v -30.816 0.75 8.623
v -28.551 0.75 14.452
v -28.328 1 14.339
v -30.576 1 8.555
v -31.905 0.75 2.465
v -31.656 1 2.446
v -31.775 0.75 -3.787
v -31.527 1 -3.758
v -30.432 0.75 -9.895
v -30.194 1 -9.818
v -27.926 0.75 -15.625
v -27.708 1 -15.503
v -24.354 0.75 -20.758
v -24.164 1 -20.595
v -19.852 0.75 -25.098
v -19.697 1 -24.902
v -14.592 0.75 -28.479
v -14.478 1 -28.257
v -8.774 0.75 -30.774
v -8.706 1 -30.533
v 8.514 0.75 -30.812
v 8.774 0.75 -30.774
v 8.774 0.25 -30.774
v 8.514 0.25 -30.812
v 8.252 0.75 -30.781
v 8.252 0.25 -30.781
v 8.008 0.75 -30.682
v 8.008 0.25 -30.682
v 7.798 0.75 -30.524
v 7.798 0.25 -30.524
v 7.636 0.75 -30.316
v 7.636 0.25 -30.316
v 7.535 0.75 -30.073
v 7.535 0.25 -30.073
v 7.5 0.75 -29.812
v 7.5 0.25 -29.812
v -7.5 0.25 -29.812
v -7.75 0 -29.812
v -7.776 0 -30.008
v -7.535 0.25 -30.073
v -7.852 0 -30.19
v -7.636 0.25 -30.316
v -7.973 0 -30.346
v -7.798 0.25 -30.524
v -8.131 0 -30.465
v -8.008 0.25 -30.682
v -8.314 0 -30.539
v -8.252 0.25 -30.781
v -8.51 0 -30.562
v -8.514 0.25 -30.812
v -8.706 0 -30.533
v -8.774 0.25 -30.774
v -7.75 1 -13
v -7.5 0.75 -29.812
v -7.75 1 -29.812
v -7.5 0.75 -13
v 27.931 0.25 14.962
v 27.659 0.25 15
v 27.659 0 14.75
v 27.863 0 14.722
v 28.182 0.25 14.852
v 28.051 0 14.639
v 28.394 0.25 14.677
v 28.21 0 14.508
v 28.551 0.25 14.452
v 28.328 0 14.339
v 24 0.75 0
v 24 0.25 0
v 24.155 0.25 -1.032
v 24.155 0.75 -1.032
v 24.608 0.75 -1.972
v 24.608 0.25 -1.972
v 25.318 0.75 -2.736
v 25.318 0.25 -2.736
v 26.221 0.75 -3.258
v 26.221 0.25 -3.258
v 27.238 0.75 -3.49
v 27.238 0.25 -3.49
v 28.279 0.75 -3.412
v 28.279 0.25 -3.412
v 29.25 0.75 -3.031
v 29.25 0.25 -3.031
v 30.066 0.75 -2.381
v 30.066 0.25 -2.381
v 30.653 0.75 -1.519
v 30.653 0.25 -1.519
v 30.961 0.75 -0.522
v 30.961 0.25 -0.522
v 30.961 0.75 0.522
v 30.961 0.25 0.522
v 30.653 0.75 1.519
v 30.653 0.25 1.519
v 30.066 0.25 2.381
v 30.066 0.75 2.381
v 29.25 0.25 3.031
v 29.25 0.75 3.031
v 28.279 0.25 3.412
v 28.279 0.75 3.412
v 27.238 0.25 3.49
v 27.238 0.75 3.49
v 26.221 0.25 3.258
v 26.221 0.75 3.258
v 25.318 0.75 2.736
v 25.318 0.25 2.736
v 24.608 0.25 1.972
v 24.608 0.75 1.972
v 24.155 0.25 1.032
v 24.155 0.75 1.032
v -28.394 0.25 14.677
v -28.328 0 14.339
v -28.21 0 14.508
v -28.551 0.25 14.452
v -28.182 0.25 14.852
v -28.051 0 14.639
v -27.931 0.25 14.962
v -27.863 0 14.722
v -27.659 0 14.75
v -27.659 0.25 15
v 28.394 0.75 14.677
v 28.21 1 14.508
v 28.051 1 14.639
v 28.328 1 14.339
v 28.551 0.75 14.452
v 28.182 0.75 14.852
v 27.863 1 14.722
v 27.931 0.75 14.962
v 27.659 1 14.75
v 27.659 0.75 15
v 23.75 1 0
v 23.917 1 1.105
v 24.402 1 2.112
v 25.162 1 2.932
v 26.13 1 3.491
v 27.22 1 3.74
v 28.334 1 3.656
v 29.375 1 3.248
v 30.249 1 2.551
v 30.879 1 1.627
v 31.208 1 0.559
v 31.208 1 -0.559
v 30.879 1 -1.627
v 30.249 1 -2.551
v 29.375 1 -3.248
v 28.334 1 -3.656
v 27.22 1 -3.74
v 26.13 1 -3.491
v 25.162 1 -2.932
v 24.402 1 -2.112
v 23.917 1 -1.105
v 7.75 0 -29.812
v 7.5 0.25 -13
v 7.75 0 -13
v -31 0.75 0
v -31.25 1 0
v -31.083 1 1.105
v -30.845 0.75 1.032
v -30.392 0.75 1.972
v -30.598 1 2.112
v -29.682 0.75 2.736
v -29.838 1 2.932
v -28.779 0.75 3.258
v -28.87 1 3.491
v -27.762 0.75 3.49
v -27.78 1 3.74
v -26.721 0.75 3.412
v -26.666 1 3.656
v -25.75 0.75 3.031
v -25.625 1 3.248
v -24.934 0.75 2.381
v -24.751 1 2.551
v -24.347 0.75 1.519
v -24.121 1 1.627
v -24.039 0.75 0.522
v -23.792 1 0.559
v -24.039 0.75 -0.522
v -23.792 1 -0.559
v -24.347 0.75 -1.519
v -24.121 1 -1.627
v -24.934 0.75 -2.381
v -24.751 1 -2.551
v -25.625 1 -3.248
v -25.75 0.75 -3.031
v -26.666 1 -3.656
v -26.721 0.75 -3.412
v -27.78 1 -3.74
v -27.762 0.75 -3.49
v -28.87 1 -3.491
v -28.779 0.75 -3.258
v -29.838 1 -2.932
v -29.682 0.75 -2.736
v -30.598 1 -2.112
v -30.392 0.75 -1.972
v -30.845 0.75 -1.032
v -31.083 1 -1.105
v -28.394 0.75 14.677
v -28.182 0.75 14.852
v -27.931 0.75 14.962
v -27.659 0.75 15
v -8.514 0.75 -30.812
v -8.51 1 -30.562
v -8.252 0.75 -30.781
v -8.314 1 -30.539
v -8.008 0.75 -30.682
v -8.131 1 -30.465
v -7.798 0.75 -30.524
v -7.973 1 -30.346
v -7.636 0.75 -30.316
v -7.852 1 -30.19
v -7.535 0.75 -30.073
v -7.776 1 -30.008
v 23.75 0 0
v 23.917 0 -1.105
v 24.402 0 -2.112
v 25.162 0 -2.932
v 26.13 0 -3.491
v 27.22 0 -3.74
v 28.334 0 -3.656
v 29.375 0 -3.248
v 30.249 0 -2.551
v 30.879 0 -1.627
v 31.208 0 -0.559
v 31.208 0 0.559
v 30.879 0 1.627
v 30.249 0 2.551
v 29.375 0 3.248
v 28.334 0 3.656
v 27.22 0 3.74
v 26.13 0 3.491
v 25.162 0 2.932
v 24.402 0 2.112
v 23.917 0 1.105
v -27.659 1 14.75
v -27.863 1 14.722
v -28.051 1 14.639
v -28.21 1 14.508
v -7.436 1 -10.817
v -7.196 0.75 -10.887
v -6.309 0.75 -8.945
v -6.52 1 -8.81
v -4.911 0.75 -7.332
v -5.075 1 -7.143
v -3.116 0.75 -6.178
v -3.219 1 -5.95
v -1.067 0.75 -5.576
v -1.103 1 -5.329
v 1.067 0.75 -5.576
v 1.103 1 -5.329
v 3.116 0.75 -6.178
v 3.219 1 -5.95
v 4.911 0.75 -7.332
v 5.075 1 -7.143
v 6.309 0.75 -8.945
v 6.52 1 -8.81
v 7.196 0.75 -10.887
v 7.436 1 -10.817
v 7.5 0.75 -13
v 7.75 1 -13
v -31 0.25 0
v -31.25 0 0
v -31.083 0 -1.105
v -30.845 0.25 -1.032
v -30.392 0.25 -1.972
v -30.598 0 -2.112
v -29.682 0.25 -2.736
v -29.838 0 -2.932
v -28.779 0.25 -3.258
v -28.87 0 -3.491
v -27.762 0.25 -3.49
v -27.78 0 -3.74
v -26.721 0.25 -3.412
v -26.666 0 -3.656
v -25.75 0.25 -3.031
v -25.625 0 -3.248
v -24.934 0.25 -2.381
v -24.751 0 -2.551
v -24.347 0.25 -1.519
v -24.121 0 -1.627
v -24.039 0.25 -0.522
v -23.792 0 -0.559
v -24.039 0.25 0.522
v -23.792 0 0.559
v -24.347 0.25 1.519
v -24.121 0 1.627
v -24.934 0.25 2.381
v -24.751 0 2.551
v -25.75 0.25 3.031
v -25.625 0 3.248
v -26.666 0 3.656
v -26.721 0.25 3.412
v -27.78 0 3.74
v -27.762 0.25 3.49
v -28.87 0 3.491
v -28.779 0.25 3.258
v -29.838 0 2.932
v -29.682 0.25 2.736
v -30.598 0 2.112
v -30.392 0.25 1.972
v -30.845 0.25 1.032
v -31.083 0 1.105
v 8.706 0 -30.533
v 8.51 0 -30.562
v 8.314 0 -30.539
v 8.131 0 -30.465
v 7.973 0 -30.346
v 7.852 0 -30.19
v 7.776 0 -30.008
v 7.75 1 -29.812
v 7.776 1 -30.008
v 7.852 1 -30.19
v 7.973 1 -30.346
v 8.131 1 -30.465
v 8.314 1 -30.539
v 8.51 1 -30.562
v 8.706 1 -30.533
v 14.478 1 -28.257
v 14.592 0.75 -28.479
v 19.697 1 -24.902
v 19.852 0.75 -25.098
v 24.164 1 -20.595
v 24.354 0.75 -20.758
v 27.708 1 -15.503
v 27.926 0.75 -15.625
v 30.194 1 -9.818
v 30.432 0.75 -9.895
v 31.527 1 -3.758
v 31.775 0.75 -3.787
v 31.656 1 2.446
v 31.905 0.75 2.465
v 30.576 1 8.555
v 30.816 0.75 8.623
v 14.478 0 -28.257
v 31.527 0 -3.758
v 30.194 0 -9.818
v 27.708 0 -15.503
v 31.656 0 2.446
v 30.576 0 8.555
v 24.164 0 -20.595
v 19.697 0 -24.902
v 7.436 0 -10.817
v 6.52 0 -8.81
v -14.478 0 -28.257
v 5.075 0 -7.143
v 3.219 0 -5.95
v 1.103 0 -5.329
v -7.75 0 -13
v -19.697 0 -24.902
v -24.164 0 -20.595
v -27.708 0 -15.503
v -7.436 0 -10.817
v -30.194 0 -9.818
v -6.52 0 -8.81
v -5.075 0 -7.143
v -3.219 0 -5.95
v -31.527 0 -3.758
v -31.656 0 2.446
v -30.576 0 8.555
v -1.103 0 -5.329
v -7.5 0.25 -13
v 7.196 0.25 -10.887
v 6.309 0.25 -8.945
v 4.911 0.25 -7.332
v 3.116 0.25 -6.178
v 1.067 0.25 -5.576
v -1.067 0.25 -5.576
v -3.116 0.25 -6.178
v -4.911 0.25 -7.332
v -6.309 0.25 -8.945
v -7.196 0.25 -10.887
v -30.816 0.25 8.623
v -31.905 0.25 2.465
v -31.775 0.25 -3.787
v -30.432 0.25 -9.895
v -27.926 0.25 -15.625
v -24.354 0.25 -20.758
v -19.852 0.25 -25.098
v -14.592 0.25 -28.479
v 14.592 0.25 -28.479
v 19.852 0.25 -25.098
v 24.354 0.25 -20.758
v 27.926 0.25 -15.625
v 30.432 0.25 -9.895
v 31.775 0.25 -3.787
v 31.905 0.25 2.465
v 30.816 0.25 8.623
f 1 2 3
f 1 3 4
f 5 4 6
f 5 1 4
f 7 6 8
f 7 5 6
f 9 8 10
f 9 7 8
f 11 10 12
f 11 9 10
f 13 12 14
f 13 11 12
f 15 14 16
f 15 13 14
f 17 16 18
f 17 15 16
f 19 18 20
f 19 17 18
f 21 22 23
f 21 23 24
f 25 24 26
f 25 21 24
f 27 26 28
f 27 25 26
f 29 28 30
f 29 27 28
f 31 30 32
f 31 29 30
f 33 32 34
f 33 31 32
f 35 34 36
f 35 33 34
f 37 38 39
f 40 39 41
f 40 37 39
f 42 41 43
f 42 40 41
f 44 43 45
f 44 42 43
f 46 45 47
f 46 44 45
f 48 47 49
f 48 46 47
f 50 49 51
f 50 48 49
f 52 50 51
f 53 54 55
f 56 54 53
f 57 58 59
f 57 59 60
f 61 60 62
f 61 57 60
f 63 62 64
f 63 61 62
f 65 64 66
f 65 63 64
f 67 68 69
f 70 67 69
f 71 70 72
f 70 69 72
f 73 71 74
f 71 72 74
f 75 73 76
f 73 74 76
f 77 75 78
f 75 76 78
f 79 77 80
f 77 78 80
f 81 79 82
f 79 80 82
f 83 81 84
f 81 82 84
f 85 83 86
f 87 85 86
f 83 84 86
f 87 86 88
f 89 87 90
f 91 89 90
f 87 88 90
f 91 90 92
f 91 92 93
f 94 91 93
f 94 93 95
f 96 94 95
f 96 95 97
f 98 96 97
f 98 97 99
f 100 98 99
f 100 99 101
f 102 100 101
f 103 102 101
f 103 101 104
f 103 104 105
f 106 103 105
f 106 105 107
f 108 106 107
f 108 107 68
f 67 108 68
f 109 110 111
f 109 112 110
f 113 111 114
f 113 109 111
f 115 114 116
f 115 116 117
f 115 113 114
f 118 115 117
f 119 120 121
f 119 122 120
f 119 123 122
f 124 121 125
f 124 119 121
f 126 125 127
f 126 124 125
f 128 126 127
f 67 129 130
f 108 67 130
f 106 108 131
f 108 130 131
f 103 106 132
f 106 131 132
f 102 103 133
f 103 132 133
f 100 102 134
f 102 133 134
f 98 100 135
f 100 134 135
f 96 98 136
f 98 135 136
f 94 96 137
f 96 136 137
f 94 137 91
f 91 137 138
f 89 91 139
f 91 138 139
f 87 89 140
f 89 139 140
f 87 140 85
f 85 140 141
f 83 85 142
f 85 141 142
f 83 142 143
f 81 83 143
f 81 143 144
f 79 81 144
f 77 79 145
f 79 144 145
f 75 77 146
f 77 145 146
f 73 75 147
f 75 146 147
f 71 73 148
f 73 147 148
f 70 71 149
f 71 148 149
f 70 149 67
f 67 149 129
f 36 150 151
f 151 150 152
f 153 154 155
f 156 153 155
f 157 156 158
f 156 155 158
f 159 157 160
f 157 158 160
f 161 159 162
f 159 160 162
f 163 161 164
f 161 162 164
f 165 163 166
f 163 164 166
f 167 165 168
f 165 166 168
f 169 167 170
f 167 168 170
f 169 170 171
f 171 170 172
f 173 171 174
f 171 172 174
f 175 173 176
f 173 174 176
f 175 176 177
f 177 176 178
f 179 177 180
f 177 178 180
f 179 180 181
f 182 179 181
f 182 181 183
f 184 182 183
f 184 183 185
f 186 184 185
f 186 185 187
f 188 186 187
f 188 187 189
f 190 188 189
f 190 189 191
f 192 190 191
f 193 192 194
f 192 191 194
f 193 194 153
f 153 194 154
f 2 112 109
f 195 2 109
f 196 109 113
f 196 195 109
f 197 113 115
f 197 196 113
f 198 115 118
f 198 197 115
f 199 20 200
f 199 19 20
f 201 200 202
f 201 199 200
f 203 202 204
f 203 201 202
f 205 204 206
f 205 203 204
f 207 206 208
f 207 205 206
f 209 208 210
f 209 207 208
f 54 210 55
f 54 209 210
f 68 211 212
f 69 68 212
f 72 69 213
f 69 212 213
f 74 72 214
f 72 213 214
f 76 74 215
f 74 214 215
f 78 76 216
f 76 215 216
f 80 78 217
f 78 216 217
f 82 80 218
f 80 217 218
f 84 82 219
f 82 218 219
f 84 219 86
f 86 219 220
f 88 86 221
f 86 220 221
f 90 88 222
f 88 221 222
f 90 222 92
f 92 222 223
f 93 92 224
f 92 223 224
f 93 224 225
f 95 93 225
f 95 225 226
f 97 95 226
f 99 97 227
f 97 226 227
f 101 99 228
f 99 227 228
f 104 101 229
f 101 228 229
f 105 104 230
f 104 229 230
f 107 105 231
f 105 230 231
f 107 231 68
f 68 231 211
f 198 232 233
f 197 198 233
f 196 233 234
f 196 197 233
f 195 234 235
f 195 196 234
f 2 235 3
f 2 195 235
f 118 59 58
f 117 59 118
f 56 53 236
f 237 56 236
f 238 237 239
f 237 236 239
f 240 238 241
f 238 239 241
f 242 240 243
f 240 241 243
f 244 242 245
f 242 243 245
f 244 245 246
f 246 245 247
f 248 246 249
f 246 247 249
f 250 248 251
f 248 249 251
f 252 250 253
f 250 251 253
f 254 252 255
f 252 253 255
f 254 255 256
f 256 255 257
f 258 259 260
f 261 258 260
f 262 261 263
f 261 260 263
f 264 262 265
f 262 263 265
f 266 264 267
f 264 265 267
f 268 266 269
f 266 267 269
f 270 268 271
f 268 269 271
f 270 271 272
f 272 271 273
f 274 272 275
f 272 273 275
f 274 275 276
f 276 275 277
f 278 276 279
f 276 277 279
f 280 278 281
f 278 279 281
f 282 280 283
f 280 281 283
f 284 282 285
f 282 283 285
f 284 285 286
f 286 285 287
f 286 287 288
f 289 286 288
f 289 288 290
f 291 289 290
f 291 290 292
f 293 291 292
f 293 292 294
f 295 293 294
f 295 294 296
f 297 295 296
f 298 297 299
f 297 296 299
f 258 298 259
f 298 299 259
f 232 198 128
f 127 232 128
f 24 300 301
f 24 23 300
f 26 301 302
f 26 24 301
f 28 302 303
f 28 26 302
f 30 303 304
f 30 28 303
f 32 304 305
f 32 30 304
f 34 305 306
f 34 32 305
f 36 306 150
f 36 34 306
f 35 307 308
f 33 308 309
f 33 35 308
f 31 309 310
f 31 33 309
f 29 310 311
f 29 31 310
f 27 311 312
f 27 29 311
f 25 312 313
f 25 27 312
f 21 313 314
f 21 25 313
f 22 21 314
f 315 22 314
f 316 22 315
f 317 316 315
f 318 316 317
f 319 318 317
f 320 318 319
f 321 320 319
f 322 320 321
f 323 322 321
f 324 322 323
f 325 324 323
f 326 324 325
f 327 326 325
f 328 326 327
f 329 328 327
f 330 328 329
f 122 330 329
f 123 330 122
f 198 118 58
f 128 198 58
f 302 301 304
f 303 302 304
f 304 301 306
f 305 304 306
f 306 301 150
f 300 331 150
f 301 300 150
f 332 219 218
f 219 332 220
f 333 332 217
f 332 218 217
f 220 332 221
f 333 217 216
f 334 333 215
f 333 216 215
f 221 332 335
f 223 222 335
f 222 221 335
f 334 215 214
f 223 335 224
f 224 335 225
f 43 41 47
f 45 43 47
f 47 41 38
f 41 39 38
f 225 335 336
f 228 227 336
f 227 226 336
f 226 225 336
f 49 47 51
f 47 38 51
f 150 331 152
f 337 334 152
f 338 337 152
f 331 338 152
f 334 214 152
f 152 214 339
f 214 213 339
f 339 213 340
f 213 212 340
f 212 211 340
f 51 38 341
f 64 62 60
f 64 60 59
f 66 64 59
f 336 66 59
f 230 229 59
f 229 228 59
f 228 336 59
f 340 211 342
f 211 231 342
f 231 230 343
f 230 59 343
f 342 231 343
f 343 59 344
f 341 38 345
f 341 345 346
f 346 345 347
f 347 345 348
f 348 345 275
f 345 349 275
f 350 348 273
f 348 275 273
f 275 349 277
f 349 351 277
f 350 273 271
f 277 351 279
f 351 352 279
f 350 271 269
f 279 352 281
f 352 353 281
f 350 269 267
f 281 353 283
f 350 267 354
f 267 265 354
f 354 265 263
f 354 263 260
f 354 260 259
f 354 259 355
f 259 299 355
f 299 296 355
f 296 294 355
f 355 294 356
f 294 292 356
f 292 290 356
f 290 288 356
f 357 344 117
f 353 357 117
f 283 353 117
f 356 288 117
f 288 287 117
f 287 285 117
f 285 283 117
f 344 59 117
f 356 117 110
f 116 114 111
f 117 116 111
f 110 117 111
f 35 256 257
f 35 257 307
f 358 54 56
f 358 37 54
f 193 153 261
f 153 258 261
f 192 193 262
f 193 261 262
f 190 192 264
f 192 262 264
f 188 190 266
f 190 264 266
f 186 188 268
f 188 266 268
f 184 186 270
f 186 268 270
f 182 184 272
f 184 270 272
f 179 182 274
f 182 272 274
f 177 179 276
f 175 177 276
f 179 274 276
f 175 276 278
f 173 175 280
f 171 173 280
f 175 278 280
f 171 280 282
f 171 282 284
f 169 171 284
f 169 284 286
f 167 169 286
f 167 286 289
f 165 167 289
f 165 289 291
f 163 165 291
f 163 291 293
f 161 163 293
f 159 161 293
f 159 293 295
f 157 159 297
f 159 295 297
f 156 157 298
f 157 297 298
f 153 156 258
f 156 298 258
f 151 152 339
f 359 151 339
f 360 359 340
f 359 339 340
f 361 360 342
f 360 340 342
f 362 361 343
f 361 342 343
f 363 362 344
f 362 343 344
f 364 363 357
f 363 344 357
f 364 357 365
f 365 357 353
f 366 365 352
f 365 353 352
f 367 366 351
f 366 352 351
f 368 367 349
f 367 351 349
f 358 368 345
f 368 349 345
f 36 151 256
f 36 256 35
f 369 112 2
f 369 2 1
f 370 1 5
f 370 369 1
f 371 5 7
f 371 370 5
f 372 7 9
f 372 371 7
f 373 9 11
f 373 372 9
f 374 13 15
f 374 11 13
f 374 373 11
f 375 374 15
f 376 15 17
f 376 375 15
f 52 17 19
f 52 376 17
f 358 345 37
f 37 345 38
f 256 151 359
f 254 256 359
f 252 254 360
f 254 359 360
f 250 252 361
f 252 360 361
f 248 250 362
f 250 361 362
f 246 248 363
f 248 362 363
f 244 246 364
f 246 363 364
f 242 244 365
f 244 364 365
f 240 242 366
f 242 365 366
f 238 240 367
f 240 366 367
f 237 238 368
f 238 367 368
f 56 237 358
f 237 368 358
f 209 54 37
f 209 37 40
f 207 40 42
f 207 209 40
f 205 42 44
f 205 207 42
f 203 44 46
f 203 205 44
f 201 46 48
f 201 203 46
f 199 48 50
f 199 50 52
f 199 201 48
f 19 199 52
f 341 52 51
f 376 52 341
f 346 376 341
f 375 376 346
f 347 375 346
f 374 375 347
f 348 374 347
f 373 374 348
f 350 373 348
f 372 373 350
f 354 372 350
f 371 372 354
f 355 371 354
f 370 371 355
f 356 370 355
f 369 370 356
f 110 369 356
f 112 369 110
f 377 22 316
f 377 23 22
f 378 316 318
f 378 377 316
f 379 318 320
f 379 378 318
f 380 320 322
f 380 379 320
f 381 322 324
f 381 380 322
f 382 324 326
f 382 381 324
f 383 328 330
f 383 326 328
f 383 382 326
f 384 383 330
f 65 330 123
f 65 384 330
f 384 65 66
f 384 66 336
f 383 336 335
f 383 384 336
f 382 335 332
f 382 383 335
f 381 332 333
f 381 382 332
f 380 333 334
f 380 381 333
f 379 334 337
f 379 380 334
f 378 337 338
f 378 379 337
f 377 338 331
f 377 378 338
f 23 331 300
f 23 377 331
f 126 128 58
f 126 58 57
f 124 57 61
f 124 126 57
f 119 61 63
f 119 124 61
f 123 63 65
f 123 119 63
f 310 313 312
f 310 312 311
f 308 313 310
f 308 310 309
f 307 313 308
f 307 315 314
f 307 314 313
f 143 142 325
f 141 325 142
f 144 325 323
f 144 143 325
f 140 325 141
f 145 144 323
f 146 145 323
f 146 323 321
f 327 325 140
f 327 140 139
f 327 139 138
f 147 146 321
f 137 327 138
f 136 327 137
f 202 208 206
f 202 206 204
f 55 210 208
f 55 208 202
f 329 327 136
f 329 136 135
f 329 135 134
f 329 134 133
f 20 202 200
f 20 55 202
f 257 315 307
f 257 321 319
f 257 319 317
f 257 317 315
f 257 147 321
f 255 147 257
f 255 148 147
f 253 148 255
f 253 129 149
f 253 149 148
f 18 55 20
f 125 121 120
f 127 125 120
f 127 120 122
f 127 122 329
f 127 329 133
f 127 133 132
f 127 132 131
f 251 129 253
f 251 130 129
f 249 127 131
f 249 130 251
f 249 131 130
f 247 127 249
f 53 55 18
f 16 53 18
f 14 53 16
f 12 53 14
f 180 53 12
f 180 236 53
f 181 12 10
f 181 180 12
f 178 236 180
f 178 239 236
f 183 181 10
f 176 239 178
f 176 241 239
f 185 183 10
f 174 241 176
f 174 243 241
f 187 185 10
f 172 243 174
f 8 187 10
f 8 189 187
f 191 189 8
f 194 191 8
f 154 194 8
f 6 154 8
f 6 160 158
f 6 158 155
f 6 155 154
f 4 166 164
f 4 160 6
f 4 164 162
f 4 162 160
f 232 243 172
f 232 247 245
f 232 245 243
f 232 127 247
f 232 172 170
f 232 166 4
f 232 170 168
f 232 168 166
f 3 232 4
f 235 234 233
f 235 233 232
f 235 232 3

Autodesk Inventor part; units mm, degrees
ref_plane "YZ Plane" through (0, 0, 0) normal (1, 0, 0) x (0, 1, 0)
ref_plane "XZ Plane" through (0, 0, 0) normal (0, 1, 0) x (-1, 0, 0)
ref_plane "XY Plane" through (0, 0, 0) normal (0, 0, 1) x (1, 0, 0)
sketch "Sketch1" plane through (0, 0, 0) normal (0, 1, 0) x (-1, 0, 0)
  circle A0 centre (0, 0) radius 32
  line L0 (27.5, 0) -> (-27.5, 0) construction
  circle A1 centre (27.5, 0) radius 3.5
  circle A2 centre (-27.5, 0) radius 3.5
  line L1 (26, 32) -> (-26, 32)
  line L2 (-26, 32) -> (-26, -32)
  line L3 (-26, -32) -> (26, -32)
  line L4 (26, -32) -> (26, 32)
  line L5 (26, 32) -> (-26, -32) construction
  line L6 (-26, 32) -> (26, -32) construction
  line L7 (0, -32) -> (0, -13) construction
  line L8 (7.5, -32) -> (7.5, -13)
  line L9 (-7.5, -13) -> (-7.5, -32)
  arc A3 (-7.5, -32) -> (7.5, -32) centre (0, -32) ccw
  arc A4 (7.5, -13) -> (-7.5, -13) centre (0, -13) ccw
  line L10 (-28.2666, 32) -> (28.2666, 32)
  line L11 (28.2666, 32) -> (28.2666, 15)
  line L12 (28.2666, 15) -> (-28.2666, 15)
  line L13 (-28.2666, 15) -> (-28.2666, 32)
  point P0 (0, -22.5)
  point P1 (0, -5.5)
  point P2 (31, 0)
  point P3 (-31, 0)
  point P4 (-7.5, -31.1087)
  point P5 (7.5, -31.1087)
  dimension "d0" = 64
  dimension "d1" = 55
  dimension "d2" = 7
  dimension "d3" = 7
  dimension "d4" = 52
  dimension "d5" = 15
  dimension "d6" = 5.5
  dimension "d13" = 15
extrude "Extrusion1" add sketch "Sketch1" along normal blind 1 contours A0 L4 A1 L12 | A0 L8 A4 L9 L2 A2 L12 L4 A1 | L2 A2 A0 L12
fillet "Fillet1" radius 1 4 edges at (-7.5, 0.5, -31.1087) (7.5, 0.5, -31.1087) (-28.2666, 0.5, 15) (28.2666, 0.5, 15)
chamfer "Chamfer1" distance 0.25 angle 45 20 edges at (-24, 0, 0) (-24, 1, 0) (29.3193, 1, -12.8211) (7.8976, 1, -30.6101) (7.5, 1, -21.406) (0, 1, -5.5) (-7.5, 1, -21.406) (-7.8976, 1, -30.6101) (-29.3193, 1, -12.8211) (-29.3193, 0, -12.8211) (-7.8976, 0, -30.6101) (-7.5, 0, -21.406) (0, 0, -5.5) (7.5, 0, -21.406) (7.8976, 0, -30.6101) (29.3193, 0, -12.8211) (31, 0, 0) (31, 1, 0) (0, 0, 15) (0, 1, 15)
properties part number "Battery Cover"
